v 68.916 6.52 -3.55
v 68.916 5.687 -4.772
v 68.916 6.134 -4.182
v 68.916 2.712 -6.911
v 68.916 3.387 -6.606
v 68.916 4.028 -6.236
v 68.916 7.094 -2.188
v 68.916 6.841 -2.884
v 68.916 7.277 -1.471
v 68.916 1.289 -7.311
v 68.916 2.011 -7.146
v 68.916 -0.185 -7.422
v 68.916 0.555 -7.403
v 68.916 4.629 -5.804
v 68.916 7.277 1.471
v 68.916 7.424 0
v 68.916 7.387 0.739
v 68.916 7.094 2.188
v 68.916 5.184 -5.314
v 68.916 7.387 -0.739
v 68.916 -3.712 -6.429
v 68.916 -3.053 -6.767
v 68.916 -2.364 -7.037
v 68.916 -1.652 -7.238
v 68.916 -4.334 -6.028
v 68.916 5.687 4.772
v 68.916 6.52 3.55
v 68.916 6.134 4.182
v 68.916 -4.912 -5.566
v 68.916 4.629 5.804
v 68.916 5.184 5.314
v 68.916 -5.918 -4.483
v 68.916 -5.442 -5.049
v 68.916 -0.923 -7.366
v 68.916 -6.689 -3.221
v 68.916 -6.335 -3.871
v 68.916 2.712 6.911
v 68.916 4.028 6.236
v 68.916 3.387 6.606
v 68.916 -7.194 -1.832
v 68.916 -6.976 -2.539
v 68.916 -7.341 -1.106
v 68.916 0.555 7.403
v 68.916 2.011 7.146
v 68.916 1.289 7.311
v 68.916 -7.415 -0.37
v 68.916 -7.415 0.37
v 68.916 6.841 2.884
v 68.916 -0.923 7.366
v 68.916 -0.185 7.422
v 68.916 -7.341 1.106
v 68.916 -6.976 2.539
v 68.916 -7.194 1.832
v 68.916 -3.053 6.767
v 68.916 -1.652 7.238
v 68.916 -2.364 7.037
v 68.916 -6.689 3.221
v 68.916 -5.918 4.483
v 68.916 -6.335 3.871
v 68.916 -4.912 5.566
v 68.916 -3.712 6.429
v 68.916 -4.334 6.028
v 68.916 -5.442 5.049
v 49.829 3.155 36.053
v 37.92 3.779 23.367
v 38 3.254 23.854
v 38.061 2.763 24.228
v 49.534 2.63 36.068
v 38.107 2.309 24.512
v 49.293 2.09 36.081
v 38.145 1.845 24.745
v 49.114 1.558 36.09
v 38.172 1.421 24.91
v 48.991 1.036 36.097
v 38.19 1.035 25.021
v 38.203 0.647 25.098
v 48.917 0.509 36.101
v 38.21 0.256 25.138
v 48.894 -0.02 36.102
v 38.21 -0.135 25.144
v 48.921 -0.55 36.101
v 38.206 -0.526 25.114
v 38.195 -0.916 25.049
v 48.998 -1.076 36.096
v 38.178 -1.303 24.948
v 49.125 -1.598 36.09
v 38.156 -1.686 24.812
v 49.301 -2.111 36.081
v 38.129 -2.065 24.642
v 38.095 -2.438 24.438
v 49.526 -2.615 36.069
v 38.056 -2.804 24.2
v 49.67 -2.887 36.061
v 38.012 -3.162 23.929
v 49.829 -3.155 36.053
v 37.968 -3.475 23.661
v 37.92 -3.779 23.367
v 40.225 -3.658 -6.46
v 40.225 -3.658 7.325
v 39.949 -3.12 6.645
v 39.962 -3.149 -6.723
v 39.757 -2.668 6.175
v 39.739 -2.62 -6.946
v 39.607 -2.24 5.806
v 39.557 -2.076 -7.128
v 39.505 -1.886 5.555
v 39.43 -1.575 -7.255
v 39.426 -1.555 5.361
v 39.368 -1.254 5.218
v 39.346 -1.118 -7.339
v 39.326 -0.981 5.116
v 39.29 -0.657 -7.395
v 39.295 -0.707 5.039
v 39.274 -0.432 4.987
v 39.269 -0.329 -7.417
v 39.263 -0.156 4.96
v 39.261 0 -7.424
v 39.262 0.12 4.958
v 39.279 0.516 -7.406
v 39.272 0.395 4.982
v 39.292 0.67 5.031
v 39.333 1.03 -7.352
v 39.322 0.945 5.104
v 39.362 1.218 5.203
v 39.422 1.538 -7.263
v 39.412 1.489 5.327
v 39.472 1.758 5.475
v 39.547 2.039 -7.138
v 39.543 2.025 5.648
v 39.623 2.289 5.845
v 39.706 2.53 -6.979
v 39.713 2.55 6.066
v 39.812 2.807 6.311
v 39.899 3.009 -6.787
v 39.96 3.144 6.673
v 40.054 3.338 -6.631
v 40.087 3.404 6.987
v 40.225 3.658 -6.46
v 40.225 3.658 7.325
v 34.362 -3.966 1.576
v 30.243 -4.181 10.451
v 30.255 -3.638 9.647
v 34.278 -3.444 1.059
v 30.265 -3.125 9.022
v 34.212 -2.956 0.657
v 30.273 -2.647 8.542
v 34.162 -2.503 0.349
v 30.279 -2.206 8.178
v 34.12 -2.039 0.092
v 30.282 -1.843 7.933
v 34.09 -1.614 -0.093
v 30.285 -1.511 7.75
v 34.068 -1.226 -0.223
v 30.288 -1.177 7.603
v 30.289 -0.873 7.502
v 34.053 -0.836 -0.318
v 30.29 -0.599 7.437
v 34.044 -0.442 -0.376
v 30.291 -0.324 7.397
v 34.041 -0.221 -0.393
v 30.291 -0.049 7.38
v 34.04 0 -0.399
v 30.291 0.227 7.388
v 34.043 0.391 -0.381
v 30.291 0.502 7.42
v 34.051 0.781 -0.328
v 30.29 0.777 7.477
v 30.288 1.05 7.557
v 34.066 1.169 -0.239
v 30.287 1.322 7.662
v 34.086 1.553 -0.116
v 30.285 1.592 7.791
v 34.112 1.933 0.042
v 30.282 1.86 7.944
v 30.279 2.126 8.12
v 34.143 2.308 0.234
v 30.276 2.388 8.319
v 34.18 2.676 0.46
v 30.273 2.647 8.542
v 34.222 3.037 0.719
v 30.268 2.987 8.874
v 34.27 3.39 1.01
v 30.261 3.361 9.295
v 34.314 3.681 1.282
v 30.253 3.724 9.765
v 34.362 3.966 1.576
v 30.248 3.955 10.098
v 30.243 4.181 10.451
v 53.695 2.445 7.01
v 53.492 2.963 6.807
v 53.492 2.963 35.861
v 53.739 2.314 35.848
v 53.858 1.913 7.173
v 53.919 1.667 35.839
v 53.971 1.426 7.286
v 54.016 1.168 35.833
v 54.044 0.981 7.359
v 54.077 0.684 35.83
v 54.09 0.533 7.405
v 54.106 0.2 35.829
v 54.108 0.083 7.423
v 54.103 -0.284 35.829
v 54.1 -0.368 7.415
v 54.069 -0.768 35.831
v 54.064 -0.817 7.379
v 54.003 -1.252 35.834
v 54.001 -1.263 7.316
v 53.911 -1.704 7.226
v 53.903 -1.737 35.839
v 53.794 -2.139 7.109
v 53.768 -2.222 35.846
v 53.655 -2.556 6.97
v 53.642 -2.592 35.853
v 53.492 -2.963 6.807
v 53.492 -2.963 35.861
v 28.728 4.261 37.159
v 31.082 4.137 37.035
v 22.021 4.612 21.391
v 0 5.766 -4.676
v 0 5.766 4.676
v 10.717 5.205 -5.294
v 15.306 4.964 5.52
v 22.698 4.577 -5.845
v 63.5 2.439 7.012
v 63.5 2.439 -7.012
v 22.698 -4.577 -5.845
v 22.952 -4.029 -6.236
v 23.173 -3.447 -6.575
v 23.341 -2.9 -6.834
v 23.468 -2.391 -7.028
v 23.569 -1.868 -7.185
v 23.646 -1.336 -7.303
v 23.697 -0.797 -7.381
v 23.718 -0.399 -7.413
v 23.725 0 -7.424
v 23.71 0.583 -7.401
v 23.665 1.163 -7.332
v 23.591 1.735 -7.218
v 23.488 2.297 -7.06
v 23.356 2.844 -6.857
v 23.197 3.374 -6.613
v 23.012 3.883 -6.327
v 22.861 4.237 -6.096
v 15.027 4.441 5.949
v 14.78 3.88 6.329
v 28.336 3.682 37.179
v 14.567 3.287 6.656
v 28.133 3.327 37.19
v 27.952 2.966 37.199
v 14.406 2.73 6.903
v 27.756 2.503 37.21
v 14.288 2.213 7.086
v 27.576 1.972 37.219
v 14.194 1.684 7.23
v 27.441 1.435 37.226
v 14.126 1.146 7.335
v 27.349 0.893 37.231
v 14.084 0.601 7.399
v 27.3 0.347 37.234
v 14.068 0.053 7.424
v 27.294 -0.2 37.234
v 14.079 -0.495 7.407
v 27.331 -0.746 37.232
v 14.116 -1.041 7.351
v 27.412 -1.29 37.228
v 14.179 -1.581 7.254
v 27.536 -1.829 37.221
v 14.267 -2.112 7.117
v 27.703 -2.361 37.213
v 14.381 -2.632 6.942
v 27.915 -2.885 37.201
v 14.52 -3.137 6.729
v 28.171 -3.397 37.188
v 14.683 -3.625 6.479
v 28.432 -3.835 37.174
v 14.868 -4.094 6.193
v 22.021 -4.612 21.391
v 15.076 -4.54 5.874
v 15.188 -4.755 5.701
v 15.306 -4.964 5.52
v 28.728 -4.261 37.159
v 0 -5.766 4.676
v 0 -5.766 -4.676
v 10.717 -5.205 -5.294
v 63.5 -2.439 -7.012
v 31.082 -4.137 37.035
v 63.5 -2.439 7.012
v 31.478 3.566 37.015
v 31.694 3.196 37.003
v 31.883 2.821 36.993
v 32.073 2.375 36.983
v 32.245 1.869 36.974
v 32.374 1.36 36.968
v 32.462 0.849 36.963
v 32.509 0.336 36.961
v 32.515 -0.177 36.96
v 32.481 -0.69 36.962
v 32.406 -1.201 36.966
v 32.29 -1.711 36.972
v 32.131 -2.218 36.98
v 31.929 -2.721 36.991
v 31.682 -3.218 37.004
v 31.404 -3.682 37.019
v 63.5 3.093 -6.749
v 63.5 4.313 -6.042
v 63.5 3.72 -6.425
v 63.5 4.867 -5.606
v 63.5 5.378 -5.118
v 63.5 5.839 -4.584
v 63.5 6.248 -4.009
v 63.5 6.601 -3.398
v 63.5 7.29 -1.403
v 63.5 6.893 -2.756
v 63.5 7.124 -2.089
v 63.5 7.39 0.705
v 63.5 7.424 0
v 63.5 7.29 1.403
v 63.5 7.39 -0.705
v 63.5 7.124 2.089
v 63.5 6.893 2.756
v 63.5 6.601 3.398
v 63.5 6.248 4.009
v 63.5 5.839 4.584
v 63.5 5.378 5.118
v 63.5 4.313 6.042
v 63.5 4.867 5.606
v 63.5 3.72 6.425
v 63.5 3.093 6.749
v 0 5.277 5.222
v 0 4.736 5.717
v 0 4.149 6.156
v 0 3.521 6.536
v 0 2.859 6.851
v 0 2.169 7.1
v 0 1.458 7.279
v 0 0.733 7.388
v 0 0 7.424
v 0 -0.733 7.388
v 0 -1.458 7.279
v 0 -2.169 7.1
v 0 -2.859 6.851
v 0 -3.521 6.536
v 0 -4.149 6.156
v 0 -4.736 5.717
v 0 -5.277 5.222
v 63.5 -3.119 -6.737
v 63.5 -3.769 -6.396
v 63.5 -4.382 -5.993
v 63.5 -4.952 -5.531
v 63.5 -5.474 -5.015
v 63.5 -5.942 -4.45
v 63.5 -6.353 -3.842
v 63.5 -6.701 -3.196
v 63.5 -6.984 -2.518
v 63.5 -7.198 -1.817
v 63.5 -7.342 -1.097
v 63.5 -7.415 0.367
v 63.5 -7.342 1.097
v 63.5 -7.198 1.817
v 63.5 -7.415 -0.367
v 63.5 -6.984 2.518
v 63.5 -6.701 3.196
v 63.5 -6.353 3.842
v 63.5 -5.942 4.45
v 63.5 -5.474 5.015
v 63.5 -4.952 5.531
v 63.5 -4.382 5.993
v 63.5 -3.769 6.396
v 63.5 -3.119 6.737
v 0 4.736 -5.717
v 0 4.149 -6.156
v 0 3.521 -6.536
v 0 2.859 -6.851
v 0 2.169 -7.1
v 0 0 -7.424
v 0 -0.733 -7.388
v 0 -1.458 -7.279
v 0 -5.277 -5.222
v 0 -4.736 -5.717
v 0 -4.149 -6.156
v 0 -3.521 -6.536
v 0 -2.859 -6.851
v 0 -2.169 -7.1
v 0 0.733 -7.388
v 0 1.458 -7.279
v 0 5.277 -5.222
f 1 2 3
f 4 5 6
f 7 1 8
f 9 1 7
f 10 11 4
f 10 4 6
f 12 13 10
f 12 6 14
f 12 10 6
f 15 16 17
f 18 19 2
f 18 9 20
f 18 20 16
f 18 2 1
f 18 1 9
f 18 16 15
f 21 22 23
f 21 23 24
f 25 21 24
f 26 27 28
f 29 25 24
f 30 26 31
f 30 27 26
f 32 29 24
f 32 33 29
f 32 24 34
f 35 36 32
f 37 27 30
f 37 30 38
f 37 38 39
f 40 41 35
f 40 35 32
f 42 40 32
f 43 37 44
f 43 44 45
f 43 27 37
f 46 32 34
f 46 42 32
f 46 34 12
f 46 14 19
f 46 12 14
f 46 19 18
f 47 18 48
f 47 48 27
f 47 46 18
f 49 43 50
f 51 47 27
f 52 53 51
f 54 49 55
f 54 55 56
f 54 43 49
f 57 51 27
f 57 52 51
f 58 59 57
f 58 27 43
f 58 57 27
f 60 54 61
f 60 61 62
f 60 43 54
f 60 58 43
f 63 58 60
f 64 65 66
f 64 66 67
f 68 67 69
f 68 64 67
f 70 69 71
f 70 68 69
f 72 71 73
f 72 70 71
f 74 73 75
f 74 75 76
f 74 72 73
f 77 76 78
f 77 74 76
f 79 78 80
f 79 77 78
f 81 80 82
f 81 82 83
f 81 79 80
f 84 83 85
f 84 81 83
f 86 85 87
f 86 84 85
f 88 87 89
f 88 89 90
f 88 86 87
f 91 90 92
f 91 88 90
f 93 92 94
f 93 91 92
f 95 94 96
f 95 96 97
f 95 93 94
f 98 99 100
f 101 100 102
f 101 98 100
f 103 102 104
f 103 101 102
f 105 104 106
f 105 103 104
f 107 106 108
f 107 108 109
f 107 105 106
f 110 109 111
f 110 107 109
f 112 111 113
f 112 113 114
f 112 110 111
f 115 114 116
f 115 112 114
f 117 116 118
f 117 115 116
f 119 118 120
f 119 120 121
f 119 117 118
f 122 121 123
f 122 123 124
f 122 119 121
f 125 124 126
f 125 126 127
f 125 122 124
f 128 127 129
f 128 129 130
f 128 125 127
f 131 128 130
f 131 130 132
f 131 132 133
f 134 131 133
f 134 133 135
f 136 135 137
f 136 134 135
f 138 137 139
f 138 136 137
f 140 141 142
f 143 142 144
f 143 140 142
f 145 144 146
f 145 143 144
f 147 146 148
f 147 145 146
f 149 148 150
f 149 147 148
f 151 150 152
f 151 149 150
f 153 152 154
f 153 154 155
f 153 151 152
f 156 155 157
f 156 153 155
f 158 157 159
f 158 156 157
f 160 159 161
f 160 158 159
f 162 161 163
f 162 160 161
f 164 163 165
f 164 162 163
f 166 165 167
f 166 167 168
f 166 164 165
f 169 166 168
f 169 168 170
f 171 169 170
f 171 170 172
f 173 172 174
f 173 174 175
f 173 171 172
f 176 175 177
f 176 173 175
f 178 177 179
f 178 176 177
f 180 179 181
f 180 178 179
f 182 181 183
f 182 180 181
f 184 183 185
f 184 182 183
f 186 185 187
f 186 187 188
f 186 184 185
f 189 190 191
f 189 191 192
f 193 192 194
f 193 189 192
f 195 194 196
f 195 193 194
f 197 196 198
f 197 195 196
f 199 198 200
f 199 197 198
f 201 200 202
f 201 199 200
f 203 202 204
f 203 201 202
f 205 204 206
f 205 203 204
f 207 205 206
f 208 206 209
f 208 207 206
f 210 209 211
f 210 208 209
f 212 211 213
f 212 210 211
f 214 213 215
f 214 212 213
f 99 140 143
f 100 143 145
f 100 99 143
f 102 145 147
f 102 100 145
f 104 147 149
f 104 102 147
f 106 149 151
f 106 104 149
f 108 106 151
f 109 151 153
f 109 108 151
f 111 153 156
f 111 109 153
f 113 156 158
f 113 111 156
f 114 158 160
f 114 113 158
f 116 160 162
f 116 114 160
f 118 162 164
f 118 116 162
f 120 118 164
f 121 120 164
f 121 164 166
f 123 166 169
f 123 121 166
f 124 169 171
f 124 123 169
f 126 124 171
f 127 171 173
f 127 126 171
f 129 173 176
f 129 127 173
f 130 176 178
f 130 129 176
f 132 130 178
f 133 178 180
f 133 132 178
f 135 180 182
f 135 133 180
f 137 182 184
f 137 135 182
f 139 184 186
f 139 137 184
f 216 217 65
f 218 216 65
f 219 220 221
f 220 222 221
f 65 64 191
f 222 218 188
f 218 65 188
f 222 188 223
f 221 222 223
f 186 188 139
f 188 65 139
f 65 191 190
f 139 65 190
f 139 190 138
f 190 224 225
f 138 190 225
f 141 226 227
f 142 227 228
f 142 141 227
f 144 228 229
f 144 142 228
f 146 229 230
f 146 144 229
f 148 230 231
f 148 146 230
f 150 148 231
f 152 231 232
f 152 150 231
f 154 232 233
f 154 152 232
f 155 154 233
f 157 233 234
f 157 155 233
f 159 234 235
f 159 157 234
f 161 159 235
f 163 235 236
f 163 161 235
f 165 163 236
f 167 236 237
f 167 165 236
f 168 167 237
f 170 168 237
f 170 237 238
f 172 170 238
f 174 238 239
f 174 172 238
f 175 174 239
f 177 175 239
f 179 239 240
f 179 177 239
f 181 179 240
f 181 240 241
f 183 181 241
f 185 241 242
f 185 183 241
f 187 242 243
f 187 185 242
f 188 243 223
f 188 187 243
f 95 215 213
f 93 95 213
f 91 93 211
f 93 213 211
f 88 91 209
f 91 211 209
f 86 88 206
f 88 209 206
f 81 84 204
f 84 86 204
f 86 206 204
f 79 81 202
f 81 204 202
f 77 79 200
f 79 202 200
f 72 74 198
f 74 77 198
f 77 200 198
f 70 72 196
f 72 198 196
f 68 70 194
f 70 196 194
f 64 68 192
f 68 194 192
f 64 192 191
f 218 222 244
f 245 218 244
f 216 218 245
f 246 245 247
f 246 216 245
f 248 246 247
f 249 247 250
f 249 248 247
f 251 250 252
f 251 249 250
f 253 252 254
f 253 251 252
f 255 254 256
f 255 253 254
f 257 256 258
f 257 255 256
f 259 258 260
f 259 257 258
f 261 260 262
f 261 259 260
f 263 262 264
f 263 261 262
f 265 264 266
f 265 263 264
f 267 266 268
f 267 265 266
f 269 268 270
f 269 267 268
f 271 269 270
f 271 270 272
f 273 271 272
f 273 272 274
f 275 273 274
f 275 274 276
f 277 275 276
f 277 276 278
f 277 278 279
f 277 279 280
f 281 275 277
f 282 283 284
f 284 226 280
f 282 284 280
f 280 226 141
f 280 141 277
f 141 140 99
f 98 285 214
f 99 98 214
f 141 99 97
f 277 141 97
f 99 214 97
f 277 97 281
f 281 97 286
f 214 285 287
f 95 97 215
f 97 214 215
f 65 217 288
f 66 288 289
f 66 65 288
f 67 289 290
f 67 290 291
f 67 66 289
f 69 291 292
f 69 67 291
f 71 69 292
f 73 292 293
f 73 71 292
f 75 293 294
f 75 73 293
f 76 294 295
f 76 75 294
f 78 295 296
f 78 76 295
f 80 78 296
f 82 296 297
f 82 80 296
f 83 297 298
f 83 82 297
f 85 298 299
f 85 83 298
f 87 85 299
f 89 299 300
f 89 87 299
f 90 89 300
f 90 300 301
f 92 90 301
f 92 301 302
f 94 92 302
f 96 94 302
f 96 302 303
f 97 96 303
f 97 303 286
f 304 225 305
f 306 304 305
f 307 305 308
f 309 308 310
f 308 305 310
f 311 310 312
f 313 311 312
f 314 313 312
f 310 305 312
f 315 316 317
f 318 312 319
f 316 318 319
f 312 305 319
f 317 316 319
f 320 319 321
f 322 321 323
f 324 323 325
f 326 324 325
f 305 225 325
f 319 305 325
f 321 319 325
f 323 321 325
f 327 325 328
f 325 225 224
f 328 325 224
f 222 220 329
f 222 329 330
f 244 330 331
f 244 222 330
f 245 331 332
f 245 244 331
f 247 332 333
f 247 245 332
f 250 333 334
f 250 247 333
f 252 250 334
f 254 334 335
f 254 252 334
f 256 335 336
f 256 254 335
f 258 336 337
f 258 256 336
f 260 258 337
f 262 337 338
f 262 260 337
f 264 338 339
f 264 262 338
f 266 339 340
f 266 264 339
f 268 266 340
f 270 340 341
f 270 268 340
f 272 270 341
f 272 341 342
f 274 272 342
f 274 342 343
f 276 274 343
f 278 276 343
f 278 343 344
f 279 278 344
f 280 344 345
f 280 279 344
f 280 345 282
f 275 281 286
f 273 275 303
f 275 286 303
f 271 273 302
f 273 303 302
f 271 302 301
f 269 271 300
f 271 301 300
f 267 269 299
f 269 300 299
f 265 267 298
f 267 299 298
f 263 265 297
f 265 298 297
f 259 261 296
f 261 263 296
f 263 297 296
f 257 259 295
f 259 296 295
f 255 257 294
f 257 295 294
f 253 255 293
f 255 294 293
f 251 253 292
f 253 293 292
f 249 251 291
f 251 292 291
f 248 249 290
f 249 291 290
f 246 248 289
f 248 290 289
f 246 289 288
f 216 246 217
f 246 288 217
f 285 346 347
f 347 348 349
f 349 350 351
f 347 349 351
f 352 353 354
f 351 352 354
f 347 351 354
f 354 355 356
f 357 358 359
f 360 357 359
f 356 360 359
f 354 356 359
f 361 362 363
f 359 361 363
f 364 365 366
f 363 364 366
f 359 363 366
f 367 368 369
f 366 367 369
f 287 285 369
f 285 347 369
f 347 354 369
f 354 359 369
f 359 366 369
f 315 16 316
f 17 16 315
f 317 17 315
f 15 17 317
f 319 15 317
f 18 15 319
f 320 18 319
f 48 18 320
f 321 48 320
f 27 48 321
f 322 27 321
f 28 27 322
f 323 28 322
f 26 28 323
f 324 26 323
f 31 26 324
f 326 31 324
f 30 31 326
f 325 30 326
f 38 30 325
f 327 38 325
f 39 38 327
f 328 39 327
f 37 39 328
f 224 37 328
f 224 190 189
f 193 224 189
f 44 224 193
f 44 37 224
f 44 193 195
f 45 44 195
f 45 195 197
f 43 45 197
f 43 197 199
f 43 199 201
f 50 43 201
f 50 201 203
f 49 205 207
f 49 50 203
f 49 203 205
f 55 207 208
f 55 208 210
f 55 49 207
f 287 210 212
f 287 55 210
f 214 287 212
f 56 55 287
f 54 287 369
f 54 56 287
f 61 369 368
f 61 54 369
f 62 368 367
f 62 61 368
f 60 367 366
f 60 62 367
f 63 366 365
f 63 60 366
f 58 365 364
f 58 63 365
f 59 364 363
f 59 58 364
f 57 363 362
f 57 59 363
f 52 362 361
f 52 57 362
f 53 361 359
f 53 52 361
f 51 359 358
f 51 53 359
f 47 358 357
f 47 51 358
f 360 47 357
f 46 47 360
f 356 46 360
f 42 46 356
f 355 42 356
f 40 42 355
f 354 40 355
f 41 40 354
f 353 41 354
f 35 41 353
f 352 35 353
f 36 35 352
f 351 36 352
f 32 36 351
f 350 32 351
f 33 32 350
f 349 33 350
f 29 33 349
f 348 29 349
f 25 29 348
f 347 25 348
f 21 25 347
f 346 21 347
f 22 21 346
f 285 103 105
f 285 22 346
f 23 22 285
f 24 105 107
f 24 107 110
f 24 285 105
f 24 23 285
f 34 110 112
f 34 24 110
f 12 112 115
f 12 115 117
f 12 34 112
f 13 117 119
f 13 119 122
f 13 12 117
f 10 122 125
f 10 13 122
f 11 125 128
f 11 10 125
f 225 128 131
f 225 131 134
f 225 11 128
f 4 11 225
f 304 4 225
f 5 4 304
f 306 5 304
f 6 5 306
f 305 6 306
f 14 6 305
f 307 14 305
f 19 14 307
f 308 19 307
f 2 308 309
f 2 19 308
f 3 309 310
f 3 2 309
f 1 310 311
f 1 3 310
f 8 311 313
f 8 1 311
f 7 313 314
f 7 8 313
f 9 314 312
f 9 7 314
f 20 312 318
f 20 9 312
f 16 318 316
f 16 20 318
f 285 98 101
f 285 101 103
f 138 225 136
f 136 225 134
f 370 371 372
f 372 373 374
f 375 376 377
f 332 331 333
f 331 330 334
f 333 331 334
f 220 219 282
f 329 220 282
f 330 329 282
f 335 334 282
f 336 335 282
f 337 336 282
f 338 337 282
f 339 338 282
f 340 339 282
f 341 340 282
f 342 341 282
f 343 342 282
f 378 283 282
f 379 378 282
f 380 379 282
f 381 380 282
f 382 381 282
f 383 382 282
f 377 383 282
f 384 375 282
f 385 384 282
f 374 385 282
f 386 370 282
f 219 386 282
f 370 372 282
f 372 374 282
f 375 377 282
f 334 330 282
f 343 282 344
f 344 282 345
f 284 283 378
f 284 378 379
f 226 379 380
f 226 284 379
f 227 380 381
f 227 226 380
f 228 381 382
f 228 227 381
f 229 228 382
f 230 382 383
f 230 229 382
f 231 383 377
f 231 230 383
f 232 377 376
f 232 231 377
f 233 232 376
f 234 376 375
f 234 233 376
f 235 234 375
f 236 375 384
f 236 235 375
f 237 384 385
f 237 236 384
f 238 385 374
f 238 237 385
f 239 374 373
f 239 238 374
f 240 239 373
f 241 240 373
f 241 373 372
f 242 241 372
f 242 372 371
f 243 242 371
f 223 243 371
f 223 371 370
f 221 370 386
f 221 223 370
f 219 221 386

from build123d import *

# Parameters (mm, degrees)
F1_R     = 7.4238247782
F3_W     = 24.2328178138
F3_H     = 90.0287199765
F3_W_2   = 11.5328170359
F3_H_2   = 77.3287191987
F4_DEPTH = 63.5
F4_TAPER = -3


with BuildPart() as f2:
    # F2: sweep along a path in F0
    with BuildLine(Plane.XZ) as f2_path:
        Line((0, 0), (18.8963264227, 0))
        Line((18.8963264227, 0), (30.0118159503, 25.0590108335))
        Line((30.0118159503, 25.0590108335), (36.1253321171, 12.3736970127))
        Line((36.1253321171, 12.3736970127), (46.6850474477, 23.2028663158))
        Line((46.6850474477, 23.2028663158), (46.6850474477, 0))
        Line((46.6850474477, 0), (68.916015327, 0))
    # F1 (on Right) → F2 (sweep)
    with BuildSketch(Plane.YZ):
        Circle(F1_R)
    sweep(path=f2_path.line, transition=Transition.RIGHT)

    # F3 (on Right) → F4 (cut, symmetric)
    with BuildSketch(Plane.YZ):
        Rectangle(F3_W, F3_H)
        Rectangle(F3_W_2, F3_H_2, mode=Mode.SUBTRACT)
    extrude(amount=F4_DEPTH, both=True, taper=F4_TAPER, mode=Mode.SUBTRACT)


solid = f2.part
